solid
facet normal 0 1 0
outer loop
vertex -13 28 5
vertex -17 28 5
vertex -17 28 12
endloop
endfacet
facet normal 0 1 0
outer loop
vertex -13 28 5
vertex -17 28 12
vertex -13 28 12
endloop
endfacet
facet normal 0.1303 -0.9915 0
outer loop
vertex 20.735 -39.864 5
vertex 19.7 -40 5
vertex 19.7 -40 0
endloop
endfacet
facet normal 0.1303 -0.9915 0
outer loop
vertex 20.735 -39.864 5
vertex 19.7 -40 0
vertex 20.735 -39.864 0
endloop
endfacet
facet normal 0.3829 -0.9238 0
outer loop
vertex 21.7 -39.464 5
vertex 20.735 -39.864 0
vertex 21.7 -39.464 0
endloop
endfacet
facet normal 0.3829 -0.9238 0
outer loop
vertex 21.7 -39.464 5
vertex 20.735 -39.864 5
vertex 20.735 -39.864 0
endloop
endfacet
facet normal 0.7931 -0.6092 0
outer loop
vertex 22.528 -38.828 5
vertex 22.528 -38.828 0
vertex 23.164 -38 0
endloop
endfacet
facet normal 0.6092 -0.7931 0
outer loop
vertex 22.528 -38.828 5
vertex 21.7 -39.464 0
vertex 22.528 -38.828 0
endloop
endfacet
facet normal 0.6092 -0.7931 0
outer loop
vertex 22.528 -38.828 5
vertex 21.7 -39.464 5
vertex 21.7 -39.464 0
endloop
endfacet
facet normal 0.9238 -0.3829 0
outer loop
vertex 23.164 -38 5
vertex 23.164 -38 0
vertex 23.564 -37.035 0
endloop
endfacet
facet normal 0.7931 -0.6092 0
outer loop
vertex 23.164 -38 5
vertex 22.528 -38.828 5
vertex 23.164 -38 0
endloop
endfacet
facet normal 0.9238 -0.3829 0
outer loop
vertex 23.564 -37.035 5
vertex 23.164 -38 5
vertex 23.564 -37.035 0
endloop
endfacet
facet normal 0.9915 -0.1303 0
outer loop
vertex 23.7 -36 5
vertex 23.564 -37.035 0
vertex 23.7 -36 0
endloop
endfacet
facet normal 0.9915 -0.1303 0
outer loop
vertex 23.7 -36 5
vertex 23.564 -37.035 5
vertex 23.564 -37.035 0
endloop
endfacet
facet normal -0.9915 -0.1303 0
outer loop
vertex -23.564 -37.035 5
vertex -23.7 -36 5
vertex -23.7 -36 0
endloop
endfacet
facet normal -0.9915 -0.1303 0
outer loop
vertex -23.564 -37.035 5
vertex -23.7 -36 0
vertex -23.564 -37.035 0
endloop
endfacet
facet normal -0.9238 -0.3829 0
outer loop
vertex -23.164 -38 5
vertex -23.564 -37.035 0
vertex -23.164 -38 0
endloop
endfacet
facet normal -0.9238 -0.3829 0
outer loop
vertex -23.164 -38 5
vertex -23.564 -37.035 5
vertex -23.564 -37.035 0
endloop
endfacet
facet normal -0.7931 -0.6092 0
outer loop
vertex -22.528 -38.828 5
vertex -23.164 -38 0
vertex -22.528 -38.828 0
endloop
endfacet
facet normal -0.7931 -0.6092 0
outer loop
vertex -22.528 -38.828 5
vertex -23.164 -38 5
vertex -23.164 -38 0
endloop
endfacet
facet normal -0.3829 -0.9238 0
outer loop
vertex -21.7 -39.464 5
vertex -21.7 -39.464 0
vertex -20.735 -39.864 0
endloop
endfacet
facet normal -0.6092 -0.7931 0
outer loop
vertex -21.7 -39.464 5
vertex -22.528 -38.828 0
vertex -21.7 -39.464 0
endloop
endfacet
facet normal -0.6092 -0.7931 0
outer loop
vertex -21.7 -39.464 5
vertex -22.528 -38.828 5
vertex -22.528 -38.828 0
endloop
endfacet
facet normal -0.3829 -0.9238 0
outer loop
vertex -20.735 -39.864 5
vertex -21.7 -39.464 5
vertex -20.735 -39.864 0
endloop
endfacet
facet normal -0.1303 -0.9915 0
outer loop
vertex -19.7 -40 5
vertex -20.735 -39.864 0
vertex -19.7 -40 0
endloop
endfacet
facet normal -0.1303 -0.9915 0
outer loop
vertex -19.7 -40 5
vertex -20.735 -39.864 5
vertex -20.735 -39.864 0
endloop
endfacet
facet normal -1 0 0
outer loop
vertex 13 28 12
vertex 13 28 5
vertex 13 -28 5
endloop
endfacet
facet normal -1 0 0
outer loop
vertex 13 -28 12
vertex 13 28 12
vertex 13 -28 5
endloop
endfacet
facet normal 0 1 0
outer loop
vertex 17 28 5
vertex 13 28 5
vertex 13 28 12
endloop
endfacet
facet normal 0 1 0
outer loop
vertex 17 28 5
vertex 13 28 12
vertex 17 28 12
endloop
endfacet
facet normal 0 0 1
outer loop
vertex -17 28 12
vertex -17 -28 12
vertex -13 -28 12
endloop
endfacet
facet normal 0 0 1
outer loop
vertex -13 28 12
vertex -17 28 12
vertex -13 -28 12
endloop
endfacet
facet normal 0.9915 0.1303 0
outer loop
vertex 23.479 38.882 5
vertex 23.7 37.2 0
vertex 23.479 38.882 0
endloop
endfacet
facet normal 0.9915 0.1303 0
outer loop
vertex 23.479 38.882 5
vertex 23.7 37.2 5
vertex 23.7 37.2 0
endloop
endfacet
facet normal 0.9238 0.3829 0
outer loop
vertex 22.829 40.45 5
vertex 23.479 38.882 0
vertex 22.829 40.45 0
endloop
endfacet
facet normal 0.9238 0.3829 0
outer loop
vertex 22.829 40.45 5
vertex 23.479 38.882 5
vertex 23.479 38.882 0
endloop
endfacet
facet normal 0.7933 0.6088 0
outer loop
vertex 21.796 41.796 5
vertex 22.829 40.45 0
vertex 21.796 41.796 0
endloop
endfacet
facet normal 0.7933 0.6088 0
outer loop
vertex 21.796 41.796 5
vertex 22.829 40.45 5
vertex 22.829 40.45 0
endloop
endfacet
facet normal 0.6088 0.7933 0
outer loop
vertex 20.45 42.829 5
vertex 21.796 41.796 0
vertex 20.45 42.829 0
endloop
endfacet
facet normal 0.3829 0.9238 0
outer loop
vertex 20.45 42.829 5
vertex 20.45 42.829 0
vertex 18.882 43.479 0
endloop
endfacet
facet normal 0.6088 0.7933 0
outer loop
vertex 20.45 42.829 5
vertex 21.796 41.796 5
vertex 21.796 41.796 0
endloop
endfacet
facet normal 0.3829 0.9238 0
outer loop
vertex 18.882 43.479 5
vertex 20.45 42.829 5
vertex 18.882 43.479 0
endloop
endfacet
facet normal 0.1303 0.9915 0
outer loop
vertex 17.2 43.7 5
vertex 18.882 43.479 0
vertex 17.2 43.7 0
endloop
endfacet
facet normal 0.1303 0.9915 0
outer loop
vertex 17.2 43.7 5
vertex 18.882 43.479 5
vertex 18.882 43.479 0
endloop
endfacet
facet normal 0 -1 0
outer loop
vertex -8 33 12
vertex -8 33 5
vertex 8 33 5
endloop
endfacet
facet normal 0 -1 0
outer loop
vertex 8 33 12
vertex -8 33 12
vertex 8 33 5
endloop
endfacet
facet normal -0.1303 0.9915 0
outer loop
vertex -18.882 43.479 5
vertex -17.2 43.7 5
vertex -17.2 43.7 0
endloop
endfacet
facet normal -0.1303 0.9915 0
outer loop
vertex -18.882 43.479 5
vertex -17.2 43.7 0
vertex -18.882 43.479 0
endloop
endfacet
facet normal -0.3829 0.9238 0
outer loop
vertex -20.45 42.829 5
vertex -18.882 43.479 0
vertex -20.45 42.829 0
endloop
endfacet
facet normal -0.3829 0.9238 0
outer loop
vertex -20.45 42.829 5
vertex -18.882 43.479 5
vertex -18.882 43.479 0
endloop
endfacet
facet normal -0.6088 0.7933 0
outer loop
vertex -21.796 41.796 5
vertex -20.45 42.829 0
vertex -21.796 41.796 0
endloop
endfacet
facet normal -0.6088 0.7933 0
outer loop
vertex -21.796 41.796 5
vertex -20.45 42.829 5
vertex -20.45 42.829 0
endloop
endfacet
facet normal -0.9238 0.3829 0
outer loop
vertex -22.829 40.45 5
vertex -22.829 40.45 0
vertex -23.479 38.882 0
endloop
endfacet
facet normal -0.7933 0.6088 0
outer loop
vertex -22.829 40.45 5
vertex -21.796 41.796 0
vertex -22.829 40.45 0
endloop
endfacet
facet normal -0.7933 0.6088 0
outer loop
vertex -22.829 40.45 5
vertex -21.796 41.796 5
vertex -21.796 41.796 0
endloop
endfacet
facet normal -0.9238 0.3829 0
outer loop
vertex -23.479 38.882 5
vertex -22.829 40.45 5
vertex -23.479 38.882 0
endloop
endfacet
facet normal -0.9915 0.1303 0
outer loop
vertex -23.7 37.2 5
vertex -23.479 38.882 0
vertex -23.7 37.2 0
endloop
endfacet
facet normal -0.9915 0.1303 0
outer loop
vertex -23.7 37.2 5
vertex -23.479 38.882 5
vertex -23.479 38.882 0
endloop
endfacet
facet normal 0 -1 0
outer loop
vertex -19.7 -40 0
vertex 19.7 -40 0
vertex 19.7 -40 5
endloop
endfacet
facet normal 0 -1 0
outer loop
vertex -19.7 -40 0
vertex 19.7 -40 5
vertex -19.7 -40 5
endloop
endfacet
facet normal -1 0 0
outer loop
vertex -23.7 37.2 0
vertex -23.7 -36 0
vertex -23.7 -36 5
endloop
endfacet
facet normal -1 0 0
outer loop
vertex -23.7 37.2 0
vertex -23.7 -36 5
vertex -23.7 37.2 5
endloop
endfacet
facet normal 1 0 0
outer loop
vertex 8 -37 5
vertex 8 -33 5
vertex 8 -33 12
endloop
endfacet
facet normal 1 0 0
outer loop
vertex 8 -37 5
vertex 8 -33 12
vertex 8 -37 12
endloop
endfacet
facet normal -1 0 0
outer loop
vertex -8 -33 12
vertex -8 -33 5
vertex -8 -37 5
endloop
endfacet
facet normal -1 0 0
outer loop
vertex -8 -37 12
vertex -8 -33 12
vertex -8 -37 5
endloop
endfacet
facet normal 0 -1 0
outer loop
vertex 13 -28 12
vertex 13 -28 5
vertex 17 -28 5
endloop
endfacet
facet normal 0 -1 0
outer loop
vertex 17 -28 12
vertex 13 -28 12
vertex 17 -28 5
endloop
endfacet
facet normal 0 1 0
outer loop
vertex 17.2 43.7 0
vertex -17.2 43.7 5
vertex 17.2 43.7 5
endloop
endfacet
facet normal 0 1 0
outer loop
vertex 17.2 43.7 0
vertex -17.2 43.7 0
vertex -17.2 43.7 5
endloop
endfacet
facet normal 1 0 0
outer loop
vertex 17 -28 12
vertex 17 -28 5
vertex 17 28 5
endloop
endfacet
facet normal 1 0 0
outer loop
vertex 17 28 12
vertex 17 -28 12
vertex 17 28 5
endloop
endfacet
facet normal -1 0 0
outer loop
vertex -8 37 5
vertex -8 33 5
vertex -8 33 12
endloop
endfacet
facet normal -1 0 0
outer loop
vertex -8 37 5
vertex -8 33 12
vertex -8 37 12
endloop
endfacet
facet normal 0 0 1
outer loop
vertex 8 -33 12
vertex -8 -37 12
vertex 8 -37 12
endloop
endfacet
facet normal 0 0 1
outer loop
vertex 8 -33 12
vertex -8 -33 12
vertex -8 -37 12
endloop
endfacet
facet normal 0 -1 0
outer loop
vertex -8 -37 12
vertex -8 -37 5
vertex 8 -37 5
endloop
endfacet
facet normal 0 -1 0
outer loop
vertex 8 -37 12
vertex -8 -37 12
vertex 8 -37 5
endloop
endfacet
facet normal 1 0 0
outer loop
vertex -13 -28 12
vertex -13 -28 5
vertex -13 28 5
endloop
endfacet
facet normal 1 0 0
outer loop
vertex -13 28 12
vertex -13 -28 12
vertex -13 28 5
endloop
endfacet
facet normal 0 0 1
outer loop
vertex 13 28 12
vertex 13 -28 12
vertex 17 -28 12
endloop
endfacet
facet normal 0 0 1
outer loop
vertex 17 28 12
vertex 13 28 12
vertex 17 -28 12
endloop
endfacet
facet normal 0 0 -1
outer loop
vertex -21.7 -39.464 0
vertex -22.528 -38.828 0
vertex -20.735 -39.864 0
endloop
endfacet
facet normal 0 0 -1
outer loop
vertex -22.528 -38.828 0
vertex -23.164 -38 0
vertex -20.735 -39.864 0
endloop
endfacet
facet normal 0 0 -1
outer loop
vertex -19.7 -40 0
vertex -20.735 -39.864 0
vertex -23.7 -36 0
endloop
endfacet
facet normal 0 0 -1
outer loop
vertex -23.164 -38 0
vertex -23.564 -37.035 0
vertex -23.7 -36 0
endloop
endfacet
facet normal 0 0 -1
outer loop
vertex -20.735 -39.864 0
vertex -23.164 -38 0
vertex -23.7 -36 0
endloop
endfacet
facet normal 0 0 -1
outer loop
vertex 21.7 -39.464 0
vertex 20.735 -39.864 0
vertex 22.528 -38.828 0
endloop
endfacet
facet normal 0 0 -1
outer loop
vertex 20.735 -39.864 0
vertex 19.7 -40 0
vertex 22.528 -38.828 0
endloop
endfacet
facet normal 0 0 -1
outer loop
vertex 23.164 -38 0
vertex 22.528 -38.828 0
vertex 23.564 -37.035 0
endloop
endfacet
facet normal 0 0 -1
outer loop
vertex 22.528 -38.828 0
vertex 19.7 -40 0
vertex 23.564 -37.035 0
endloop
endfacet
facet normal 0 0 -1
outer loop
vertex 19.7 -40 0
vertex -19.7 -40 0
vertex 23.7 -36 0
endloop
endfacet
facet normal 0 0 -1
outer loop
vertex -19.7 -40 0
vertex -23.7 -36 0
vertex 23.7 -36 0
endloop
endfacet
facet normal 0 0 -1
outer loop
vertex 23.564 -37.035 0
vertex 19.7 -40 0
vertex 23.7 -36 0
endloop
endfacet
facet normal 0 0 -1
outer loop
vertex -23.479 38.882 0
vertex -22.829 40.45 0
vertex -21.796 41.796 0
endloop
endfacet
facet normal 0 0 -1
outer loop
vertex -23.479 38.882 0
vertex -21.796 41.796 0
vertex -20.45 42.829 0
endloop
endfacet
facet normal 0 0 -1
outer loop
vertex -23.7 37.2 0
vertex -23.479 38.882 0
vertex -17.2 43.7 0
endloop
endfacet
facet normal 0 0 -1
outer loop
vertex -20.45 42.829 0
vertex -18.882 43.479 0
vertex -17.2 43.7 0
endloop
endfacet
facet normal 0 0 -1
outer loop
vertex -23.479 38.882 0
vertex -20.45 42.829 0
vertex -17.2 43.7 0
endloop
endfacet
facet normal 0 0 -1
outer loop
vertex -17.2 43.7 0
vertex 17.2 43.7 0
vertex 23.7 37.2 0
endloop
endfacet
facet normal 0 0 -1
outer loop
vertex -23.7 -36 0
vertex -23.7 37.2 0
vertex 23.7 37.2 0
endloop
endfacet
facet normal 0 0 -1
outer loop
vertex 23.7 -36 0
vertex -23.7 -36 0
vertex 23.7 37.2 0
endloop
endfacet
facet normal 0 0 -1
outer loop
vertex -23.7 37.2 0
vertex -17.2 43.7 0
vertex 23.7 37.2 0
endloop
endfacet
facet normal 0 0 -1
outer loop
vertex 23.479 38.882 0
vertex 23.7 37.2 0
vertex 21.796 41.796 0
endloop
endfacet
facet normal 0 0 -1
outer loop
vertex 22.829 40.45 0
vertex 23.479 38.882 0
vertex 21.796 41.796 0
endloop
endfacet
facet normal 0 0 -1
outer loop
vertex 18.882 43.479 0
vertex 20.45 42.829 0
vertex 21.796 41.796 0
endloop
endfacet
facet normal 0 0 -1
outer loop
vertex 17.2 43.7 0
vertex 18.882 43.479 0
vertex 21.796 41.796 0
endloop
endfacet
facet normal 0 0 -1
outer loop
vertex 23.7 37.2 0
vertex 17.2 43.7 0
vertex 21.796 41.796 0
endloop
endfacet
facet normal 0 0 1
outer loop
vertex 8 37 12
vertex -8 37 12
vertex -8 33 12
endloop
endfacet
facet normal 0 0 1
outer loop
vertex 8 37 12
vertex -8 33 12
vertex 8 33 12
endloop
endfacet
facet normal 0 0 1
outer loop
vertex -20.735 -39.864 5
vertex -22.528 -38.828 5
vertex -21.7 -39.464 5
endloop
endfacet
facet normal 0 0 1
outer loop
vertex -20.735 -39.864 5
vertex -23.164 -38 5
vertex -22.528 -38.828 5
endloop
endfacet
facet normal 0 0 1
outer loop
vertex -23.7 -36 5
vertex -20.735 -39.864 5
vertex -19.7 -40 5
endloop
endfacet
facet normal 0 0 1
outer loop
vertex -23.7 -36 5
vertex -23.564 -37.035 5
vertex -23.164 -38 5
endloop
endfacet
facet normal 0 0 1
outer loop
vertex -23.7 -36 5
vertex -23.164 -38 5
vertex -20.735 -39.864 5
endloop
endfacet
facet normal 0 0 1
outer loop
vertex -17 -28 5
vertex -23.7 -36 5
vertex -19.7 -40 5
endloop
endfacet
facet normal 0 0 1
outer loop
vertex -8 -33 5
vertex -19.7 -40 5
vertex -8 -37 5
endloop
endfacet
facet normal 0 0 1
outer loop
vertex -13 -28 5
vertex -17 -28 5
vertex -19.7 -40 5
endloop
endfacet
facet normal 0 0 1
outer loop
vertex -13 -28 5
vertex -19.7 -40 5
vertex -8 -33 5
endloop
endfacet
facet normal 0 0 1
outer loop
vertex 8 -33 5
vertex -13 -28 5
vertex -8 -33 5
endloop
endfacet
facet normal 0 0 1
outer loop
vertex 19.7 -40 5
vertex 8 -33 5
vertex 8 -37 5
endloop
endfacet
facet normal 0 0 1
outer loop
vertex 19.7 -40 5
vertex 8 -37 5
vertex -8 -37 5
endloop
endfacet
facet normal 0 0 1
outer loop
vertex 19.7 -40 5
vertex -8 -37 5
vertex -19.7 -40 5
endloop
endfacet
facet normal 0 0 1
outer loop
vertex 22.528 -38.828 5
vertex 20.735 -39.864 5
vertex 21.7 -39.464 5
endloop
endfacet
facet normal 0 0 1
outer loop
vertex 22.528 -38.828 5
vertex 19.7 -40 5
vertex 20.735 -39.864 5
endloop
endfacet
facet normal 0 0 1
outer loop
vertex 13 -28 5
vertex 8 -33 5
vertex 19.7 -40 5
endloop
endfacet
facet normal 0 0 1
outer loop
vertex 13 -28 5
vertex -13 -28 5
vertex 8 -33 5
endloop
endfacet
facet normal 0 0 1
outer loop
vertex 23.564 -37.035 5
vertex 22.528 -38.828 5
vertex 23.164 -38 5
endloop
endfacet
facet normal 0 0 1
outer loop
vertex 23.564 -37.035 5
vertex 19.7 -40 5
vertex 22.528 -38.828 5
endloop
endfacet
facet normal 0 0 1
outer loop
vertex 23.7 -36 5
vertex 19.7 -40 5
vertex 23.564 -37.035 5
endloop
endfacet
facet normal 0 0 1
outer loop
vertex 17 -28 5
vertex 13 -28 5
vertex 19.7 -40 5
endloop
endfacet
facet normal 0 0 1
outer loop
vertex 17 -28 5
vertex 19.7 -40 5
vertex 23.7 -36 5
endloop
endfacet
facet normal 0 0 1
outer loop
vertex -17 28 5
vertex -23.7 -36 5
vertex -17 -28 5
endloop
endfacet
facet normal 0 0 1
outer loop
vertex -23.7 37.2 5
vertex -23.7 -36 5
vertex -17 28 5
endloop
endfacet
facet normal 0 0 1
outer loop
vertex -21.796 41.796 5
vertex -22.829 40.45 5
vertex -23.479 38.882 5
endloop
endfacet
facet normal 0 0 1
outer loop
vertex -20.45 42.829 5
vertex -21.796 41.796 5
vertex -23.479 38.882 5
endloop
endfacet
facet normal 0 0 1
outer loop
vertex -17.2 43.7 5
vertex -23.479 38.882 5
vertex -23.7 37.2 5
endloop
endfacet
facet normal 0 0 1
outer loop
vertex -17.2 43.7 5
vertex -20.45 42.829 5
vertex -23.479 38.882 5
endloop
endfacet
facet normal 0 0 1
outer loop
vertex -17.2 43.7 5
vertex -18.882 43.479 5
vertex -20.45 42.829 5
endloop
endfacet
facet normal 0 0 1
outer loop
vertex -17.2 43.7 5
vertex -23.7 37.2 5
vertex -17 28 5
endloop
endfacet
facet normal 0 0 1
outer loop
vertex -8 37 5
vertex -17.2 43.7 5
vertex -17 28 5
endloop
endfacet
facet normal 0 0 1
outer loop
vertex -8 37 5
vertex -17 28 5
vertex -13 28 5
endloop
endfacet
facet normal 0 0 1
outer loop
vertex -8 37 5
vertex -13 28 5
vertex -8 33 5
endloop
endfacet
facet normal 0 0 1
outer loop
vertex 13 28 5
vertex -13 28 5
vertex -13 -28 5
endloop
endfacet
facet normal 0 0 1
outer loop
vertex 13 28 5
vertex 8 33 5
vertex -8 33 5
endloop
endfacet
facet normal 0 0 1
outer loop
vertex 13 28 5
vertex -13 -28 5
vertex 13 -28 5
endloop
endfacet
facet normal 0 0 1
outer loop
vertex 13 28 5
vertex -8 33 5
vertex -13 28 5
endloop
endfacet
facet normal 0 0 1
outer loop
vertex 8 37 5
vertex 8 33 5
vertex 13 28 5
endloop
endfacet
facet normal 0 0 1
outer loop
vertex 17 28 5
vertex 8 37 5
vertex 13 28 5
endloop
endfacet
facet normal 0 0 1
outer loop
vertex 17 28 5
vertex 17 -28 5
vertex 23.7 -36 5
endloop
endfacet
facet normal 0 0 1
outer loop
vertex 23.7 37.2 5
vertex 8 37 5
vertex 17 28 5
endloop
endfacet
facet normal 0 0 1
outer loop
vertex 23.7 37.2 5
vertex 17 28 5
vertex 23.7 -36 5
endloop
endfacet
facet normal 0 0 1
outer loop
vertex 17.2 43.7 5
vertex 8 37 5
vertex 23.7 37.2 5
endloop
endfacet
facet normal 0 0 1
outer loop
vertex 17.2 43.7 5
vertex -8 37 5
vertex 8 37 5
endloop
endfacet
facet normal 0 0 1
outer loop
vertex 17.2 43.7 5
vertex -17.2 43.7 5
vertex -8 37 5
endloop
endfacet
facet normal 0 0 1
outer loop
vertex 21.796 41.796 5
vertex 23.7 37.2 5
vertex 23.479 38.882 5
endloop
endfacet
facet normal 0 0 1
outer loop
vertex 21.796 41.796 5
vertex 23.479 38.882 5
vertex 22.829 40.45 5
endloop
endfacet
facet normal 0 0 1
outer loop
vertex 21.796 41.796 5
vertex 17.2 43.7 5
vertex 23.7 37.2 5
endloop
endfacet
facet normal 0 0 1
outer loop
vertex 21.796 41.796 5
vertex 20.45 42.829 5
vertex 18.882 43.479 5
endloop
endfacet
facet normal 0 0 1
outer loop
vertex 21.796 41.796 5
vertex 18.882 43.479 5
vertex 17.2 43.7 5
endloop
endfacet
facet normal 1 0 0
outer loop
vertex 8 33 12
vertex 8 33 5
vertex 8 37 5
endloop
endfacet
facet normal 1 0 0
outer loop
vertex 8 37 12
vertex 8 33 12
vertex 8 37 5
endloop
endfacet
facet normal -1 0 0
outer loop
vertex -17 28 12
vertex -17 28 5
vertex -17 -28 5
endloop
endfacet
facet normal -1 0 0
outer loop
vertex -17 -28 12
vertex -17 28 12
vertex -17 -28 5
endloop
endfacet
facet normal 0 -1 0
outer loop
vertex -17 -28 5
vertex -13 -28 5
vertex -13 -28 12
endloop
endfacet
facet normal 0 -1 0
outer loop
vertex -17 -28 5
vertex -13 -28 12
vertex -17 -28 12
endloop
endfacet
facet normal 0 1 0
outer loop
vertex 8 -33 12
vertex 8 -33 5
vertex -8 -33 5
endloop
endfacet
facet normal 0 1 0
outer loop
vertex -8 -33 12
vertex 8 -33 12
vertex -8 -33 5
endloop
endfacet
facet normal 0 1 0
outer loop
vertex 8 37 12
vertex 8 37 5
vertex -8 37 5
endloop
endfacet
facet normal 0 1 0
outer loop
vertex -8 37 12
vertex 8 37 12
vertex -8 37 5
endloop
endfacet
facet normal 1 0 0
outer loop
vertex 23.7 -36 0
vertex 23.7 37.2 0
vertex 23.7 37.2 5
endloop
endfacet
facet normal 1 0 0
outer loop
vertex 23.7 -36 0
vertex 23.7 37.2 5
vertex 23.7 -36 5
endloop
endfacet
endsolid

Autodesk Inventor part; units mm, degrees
ref_plane "YZ Plane" through (0, 0, 0) normal (1, 0, 0) x (0, 1, 0)
ref_plane "XZ Plane" through (0, 0, 0) normal (0, 1, 0) x (-1, 0, 0)
ref_plane "XY Plane" through (0, 0, 0) normal (0, 0, 1) x (1, 0, 0)
sketch "Boceto1" plane through (0, 0, 0) normal (0, 0, 1) x (1, 0, 0)
  line L0 (20, -40) -> (-20, -40)
  line L1 (-20, -40) -> (-20, 40)
  line L2 (-20, 40) -> (20, 40)
  line L3 (20, 40) -> (20, -40)
  line L4 (20, -40) -> (-20, 40) construction
  line L5 (-20, -40) -> (20, 40) construction
  line L6 (23.7, -43.7) -> (-23.7, -43.7)
  line L7 (-23.7, -43.7) -> (-23.7, 43.7)
  line L8 (-23.7, 43.7) -> (23.7, 43.7)
  line L9 (23.7, 43.7) -> (23.7, -43.7)
  line L10 (-23.7, -40) -> (23.7, -40)
  point P0 (0, 0)
  dimension "d0" = 40
  dimension "d1" = 80
  dimension "d2" = 3.7
  dimension "d20" = 3.7
extrude "Extrusión1" add sketch "Boceto1" along normal blind 5 contours L0 L1 L2 L3 | L3 L2 L1 L10 L7 L8 L9
sketch "Boceto2" plane through (0, 0, 5) normal (0, 0, 1) x (1, 0, 0)
  line L0 (17.5, -37.5) -> (-17.5, -37.5)
  line L1 (-17.5, -37.5) -> (-17.5, 37.5)
  line L2 (-17.5, 37.5) -> (17.5, 37.5)
  line L3 (17.5, 37.5) -> (17.5, -37.5)
  line L4 (17.5, -37.5) -> (-17.5, 37.5) construction
  line L5 (-17.5, -37.5) -> (17.5, 37.5) construction
  line L6 (17, 37) -> (-17, 37)
  line L7 (-17, 37) -> (-17, -37)
  line L8 (-17, -37) -> (17, -37)
  line L9 (17, -37) -> (17, 37)
  line L10 (-13, 33) -> (13, 33)
  line L11 (13, 33) -> (13, -33)
  line L12 (13, -33) -> (-13, -33)
  line L13 (-13, -33) -> (-13, 33)
  line L14 (8, 33) -> (8, 37)
  line L15 (-8, 33) -> (-8, 37)
  line L16 (13, 28) -> (17, 28)
  line L17 (13, -28) -> (17, -28)
  line L18 (-13, -28) -> (-17, -28)
  line L19 (-8, -33) -> (-8, -37)
  line L20 (8, -33) -> (8, -37)
  line L21 (-17, 28) -> (-13, 28)
  point P0 (0, 0)
  dimension "d5" = 35
  dimension "d6" = 75
  dimension "d7" = 0.5
  dimension "d8" = 4
  dimension "d9" = 5
  dimension "d10" = 5
  dimension "d11" = 5
  dimension "d12" = 5
  dimension "d13" = 5
  dimension "d14" = 5
  dimension "d15" = 5
  dimension "d16" = 5
extrude "Extrusión2" add sketch "Boceto2" along normal blind 7 contours L14 L10 L15 L6 | L9 L17 L11 L16 | L21 L13 L18 L7 | L8 L19 L12 L20
fillet "Empalme1" radius 6.5 2 edges at (23.7, 43.7, 2.5) (-23.7, 43.7, 2.5)
fillet "Empalme2" radius 4 2 edges at (-23.7, -40, 2.5) (23.7, -40, 2.5)
properties part number "Tapacanto delantero"
